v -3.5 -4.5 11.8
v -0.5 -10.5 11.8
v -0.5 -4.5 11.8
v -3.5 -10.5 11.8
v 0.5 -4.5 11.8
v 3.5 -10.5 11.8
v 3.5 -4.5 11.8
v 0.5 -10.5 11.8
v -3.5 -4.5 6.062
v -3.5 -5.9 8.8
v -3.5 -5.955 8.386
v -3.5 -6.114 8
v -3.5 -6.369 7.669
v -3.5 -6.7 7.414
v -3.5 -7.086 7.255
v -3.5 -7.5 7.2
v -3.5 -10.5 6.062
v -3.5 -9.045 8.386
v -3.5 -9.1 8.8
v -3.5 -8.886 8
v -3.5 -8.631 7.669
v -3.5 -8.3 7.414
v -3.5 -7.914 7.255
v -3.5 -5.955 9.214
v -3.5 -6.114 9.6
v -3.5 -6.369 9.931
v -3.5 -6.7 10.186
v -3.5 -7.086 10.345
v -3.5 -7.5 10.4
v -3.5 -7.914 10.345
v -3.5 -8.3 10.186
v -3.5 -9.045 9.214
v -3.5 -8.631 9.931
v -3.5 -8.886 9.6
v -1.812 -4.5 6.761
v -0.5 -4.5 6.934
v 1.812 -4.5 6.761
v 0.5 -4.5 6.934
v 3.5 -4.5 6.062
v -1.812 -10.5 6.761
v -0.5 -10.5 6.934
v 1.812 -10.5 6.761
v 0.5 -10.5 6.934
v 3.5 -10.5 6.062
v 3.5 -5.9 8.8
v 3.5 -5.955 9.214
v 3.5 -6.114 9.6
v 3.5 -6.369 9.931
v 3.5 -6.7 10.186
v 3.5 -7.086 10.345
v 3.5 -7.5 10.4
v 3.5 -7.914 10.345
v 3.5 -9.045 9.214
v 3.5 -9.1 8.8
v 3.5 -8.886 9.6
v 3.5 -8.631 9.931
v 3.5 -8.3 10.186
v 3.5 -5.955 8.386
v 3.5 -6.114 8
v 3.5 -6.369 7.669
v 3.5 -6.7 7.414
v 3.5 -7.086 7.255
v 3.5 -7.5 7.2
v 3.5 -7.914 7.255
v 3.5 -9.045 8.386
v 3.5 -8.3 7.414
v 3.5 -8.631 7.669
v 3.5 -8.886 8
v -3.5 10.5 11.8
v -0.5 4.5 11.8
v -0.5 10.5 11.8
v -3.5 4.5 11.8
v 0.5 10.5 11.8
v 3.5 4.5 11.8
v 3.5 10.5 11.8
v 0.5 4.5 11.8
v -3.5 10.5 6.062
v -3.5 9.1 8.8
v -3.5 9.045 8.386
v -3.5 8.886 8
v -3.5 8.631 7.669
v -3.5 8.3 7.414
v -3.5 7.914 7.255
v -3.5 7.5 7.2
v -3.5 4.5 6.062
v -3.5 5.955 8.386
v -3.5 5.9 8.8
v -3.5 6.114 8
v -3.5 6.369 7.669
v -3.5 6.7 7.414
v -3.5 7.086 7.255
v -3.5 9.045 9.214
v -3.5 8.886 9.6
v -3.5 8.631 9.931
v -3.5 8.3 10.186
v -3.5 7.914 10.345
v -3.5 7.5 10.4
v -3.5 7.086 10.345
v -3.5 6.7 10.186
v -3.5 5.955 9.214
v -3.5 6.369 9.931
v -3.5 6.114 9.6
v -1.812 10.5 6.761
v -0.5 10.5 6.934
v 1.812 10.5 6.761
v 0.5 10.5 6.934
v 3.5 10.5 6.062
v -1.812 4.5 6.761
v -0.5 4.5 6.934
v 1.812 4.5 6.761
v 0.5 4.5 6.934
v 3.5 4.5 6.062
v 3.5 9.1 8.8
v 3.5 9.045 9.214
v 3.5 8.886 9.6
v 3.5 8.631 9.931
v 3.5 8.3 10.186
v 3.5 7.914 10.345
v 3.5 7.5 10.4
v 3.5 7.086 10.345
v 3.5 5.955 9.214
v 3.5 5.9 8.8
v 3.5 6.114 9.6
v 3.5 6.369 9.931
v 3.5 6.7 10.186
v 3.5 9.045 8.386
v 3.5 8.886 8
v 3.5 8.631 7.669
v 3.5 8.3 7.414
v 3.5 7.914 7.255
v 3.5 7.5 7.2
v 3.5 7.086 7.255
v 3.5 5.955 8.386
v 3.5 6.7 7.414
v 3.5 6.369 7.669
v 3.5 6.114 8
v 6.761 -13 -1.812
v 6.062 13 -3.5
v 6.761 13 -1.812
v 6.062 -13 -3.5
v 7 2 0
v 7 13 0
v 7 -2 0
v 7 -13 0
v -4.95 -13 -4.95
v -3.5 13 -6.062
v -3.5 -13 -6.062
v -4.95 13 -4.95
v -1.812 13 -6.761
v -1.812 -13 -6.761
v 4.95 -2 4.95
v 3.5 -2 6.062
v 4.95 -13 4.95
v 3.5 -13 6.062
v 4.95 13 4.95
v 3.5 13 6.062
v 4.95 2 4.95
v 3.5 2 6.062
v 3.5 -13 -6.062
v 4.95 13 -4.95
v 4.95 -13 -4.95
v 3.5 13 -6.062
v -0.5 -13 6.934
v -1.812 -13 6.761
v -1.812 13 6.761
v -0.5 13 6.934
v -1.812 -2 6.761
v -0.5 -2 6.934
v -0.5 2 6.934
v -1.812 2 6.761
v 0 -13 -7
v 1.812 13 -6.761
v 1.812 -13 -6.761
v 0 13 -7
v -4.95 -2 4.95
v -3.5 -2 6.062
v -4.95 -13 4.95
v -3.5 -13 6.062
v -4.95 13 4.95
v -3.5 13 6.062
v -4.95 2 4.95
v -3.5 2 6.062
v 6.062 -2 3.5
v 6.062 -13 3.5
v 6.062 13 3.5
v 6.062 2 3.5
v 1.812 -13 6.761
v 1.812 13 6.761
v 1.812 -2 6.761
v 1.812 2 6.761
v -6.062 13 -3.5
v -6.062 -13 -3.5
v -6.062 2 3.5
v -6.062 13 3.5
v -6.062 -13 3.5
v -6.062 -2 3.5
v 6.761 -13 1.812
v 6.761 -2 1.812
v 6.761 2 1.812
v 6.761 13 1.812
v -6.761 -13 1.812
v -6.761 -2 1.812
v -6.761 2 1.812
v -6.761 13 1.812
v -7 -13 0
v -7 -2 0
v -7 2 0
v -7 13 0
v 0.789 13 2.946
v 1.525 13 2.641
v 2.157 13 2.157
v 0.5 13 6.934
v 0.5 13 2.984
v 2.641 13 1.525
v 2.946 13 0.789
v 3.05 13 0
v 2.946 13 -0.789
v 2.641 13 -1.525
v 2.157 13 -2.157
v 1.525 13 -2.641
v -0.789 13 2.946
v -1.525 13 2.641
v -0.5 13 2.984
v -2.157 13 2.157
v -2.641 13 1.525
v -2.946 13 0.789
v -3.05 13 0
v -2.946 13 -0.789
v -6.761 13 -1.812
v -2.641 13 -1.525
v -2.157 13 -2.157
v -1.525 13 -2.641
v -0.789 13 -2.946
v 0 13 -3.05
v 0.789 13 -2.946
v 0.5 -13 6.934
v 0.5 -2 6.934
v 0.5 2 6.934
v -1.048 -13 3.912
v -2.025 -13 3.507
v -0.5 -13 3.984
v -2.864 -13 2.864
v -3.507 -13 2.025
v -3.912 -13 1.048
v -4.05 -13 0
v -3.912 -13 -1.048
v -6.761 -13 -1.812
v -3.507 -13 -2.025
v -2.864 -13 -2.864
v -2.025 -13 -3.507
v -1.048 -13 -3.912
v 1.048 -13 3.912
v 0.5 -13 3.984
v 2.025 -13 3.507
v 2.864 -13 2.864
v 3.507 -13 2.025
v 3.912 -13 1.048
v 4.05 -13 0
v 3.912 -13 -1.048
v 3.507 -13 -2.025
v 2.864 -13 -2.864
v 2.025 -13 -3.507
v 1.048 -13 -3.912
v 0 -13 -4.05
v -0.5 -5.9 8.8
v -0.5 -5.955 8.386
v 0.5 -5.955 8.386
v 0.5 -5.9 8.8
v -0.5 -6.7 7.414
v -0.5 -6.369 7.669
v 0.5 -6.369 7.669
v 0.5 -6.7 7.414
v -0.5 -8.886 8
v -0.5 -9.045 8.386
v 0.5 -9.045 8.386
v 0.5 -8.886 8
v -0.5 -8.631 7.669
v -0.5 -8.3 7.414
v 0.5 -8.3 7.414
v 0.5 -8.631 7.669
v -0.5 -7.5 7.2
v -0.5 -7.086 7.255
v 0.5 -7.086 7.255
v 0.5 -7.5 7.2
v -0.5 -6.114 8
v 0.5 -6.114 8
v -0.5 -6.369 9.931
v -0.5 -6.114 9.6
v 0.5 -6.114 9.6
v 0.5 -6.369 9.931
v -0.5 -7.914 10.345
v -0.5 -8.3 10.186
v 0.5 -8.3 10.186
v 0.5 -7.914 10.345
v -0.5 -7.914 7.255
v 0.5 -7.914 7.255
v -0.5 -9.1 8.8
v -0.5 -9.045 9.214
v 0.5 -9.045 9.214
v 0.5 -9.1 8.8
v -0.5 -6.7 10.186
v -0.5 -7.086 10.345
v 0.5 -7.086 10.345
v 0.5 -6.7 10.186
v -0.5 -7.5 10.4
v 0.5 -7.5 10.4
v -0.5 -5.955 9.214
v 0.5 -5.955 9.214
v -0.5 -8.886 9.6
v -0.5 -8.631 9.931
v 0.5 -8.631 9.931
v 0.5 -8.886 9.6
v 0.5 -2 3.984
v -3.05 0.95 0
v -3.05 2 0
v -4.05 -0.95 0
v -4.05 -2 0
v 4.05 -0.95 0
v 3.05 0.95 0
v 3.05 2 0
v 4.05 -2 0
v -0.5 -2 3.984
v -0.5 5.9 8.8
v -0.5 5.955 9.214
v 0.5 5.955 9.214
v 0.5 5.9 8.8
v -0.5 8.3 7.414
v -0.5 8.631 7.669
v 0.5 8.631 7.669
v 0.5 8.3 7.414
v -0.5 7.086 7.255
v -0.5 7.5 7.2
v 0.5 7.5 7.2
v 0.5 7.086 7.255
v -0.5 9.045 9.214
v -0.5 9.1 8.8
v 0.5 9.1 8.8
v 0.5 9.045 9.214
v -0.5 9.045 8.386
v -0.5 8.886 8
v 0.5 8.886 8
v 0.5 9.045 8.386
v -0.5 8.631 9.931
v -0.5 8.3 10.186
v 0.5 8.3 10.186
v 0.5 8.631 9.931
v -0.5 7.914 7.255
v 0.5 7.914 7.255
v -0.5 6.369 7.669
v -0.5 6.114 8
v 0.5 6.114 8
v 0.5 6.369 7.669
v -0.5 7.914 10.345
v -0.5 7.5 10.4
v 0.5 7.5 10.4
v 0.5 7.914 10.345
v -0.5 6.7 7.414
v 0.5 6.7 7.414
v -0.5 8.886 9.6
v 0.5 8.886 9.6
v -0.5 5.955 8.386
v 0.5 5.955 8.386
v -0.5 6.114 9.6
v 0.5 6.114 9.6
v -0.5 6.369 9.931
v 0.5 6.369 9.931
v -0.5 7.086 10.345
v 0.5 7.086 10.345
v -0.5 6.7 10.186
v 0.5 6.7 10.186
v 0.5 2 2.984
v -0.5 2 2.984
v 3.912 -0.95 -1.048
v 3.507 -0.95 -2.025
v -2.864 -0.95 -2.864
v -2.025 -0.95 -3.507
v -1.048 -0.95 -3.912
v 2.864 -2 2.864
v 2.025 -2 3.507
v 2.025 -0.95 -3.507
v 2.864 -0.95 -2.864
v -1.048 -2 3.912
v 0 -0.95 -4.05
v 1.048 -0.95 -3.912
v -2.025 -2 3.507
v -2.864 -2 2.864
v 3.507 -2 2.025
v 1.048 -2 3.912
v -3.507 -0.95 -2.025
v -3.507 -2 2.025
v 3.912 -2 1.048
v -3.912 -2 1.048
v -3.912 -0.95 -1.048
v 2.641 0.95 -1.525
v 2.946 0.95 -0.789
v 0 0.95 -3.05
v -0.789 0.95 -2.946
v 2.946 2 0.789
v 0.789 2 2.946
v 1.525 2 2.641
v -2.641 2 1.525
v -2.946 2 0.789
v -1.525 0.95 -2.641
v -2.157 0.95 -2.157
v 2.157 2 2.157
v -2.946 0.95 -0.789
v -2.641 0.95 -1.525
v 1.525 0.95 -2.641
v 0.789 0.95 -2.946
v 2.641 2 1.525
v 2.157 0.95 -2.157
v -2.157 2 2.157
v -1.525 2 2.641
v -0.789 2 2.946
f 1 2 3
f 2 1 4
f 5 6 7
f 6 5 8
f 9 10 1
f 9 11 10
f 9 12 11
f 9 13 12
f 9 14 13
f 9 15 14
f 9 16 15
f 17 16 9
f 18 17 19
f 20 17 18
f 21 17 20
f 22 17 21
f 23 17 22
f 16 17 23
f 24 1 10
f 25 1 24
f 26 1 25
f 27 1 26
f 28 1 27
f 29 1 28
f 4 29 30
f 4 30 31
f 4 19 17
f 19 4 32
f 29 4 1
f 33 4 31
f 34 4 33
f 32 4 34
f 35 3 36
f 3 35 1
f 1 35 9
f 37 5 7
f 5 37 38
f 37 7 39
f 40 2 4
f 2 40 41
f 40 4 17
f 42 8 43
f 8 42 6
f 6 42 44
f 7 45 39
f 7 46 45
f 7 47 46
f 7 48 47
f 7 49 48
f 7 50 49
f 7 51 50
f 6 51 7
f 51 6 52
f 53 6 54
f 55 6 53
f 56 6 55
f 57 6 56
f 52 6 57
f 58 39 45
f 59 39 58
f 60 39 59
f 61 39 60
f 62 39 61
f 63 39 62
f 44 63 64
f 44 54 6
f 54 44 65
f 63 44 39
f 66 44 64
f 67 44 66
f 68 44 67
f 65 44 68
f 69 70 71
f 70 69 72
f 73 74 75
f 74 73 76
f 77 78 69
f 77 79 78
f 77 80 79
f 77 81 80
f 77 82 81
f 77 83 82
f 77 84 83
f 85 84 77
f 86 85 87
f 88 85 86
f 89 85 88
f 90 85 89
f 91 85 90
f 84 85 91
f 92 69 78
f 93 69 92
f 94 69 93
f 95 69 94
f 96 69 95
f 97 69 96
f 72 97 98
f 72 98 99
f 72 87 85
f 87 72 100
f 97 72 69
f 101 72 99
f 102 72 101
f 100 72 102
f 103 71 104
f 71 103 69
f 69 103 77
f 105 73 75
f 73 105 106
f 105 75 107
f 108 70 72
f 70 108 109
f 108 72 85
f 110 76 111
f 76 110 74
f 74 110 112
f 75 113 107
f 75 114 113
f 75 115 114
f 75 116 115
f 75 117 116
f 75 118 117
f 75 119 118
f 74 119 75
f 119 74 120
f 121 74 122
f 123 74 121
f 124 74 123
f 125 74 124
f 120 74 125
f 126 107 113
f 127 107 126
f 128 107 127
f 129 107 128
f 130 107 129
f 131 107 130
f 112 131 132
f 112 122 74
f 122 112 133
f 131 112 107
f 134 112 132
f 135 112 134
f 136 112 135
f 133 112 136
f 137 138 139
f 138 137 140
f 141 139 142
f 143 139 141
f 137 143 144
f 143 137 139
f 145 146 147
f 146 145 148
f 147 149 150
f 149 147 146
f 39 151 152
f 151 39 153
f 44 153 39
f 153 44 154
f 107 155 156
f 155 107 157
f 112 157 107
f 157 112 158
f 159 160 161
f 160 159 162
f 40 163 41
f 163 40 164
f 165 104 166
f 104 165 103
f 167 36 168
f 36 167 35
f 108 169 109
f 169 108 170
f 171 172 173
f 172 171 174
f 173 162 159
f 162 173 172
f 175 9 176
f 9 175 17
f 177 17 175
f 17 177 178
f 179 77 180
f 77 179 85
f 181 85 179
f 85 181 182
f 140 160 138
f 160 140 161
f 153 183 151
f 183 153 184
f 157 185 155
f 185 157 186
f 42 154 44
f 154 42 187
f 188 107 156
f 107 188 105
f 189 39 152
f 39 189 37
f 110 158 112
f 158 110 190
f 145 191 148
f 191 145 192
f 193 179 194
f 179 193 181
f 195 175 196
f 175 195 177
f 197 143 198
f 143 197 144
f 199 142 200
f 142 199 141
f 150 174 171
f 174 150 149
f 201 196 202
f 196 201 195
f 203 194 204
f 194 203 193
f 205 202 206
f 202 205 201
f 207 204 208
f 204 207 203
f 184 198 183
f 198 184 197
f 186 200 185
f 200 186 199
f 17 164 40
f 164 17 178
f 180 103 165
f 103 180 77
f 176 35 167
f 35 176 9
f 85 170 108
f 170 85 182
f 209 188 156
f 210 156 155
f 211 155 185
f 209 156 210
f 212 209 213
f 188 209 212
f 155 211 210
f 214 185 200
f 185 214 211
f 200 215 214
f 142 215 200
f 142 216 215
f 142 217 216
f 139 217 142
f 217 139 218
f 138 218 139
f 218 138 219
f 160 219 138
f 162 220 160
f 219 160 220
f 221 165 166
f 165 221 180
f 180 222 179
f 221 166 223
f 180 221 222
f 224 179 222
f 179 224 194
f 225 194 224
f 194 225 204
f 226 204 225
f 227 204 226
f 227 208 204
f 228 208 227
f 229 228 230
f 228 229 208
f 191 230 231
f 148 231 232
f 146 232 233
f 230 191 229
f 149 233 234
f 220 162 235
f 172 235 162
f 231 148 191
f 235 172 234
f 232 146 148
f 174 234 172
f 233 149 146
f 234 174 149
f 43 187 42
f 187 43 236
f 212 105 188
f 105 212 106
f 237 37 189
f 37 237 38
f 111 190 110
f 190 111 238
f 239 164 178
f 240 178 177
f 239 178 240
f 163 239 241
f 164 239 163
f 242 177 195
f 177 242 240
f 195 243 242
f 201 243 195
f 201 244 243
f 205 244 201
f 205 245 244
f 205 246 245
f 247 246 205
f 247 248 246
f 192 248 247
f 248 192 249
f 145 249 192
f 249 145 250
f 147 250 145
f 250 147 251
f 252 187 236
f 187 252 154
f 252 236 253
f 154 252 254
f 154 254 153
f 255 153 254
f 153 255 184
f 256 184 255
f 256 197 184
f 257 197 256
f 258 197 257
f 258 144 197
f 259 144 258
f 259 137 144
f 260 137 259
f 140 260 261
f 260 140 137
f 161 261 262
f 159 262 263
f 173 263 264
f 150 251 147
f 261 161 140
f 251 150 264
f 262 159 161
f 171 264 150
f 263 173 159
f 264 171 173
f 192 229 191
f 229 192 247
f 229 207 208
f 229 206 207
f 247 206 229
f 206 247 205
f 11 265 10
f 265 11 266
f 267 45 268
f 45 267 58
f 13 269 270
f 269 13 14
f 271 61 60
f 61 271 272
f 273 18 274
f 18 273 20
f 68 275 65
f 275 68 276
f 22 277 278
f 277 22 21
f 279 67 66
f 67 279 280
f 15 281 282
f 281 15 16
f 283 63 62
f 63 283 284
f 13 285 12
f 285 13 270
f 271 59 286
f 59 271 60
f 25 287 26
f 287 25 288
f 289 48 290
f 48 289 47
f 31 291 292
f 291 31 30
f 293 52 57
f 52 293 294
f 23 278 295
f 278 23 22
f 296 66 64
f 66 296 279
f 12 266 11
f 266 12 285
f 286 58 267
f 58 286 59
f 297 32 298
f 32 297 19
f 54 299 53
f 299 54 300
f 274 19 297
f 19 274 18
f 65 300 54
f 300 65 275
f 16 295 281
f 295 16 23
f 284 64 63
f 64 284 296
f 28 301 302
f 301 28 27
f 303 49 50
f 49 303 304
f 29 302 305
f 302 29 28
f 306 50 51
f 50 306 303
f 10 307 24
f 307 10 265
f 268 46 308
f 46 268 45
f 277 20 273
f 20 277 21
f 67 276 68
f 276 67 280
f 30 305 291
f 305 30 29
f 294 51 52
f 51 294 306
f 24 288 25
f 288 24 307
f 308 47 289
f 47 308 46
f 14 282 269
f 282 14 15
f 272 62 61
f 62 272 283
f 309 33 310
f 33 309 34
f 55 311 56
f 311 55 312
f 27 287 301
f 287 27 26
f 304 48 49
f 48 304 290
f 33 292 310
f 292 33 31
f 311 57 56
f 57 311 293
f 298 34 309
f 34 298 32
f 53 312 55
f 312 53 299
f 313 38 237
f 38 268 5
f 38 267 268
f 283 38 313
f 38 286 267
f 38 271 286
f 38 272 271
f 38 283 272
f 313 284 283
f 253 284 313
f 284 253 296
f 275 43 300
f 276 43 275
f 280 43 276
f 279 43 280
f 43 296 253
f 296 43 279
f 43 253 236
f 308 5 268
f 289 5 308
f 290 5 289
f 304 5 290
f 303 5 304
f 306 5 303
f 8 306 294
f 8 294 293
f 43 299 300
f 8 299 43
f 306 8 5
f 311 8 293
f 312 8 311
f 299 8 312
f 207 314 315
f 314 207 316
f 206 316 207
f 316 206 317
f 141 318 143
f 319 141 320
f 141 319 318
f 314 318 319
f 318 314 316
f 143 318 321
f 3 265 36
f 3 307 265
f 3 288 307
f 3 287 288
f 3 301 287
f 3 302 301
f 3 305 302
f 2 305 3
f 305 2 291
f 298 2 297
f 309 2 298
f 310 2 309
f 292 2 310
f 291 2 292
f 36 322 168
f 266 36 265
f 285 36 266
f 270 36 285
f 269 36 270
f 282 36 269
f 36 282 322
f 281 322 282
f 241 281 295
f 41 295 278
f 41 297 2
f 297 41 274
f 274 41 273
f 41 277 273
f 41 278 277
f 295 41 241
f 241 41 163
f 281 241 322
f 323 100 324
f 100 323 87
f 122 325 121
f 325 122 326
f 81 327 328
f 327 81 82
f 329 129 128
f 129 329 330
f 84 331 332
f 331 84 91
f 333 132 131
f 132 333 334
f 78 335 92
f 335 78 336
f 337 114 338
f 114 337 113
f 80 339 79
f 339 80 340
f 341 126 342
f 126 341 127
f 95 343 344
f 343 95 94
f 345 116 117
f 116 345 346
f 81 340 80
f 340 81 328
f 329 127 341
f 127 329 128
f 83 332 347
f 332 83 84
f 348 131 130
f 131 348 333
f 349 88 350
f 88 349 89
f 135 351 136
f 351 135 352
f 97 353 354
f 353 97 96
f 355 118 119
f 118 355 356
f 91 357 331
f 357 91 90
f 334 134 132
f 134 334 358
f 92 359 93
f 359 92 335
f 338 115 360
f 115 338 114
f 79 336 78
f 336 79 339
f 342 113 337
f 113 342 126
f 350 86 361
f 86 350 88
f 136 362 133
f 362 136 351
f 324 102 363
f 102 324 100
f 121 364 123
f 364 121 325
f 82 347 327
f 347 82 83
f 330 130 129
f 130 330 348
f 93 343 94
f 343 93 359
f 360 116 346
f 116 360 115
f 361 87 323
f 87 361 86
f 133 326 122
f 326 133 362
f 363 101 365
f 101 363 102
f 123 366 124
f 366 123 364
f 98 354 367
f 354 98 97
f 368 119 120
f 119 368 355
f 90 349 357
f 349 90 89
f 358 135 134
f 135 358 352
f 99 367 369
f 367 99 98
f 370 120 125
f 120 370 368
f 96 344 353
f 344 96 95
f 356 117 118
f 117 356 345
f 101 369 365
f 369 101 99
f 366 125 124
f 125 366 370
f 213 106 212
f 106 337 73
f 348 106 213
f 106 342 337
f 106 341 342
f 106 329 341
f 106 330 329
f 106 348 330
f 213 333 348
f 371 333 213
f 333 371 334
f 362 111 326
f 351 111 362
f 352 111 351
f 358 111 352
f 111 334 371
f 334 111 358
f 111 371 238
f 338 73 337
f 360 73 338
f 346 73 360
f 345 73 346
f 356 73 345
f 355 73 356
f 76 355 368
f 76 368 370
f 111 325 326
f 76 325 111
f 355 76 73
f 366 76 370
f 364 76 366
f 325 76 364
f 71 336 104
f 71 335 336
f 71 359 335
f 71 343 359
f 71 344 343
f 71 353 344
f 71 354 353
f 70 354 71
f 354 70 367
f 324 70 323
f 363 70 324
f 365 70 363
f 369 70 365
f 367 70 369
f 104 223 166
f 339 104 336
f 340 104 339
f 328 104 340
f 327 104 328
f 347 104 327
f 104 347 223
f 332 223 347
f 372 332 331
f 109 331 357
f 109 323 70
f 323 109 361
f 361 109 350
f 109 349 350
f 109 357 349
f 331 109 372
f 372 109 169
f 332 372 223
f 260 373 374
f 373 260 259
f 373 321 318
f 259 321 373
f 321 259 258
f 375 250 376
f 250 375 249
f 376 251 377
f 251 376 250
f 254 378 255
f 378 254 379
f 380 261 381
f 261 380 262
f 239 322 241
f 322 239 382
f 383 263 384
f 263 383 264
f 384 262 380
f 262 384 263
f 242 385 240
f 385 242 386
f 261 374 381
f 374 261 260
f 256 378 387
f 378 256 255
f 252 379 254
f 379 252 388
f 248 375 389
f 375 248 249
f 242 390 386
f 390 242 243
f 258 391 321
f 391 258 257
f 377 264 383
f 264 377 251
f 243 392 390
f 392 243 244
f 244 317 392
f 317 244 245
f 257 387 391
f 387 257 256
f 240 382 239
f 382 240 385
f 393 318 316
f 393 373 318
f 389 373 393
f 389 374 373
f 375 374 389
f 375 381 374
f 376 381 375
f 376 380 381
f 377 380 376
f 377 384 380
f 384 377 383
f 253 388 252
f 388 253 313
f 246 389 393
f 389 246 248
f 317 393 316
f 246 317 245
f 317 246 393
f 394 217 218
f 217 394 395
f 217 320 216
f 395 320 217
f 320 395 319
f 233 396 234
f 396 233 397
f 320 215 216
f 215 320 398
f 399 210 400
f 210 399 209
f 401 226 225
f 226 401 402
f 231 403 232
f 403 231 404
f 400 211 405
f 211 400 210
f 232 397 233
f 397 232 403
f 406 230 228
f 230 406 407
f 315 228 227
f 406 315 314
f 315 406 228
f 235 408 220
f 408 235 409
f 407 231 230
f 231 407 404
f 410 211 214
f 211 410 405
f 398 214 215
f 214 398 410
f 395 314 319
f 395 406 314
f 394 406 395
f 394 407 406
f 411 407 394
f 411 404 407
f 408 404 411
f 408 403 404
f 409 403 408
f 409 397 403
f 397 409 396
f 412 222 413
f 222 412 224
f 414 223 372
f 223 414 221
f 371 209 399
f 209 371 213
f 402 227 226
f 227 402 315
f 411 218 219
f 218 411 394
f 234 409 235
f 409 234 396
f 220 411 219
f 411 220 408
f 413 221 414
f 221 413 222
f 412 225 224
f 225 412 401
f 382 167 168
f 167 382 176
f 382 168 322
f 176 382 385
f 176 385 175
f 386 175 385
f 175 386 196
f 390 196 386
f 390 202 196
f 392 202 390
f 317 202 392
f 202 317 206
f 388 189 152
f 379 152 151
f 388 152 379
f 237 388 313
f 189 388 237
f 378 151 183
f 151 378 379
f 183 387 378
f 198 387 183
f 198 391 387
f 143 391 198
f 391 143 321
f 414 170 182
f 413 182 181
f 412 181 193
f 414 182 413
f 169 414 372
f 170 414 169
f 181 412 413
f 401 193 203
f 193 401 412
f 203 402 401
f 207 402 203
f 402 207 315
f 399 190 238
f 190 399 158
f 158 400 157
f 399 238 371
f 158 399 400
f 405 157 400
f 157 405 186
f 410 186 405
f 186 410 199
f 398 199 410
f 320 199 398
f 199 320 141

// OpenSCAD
// Legacy wrapper kept so older bookmarks still open the current coupler.
// The design has been changed from an Oldham coupler to a solid sleeve coupler.

part_mode = "solid_coupler";
part_cutaway = false;

include <frame_v3.scad>
